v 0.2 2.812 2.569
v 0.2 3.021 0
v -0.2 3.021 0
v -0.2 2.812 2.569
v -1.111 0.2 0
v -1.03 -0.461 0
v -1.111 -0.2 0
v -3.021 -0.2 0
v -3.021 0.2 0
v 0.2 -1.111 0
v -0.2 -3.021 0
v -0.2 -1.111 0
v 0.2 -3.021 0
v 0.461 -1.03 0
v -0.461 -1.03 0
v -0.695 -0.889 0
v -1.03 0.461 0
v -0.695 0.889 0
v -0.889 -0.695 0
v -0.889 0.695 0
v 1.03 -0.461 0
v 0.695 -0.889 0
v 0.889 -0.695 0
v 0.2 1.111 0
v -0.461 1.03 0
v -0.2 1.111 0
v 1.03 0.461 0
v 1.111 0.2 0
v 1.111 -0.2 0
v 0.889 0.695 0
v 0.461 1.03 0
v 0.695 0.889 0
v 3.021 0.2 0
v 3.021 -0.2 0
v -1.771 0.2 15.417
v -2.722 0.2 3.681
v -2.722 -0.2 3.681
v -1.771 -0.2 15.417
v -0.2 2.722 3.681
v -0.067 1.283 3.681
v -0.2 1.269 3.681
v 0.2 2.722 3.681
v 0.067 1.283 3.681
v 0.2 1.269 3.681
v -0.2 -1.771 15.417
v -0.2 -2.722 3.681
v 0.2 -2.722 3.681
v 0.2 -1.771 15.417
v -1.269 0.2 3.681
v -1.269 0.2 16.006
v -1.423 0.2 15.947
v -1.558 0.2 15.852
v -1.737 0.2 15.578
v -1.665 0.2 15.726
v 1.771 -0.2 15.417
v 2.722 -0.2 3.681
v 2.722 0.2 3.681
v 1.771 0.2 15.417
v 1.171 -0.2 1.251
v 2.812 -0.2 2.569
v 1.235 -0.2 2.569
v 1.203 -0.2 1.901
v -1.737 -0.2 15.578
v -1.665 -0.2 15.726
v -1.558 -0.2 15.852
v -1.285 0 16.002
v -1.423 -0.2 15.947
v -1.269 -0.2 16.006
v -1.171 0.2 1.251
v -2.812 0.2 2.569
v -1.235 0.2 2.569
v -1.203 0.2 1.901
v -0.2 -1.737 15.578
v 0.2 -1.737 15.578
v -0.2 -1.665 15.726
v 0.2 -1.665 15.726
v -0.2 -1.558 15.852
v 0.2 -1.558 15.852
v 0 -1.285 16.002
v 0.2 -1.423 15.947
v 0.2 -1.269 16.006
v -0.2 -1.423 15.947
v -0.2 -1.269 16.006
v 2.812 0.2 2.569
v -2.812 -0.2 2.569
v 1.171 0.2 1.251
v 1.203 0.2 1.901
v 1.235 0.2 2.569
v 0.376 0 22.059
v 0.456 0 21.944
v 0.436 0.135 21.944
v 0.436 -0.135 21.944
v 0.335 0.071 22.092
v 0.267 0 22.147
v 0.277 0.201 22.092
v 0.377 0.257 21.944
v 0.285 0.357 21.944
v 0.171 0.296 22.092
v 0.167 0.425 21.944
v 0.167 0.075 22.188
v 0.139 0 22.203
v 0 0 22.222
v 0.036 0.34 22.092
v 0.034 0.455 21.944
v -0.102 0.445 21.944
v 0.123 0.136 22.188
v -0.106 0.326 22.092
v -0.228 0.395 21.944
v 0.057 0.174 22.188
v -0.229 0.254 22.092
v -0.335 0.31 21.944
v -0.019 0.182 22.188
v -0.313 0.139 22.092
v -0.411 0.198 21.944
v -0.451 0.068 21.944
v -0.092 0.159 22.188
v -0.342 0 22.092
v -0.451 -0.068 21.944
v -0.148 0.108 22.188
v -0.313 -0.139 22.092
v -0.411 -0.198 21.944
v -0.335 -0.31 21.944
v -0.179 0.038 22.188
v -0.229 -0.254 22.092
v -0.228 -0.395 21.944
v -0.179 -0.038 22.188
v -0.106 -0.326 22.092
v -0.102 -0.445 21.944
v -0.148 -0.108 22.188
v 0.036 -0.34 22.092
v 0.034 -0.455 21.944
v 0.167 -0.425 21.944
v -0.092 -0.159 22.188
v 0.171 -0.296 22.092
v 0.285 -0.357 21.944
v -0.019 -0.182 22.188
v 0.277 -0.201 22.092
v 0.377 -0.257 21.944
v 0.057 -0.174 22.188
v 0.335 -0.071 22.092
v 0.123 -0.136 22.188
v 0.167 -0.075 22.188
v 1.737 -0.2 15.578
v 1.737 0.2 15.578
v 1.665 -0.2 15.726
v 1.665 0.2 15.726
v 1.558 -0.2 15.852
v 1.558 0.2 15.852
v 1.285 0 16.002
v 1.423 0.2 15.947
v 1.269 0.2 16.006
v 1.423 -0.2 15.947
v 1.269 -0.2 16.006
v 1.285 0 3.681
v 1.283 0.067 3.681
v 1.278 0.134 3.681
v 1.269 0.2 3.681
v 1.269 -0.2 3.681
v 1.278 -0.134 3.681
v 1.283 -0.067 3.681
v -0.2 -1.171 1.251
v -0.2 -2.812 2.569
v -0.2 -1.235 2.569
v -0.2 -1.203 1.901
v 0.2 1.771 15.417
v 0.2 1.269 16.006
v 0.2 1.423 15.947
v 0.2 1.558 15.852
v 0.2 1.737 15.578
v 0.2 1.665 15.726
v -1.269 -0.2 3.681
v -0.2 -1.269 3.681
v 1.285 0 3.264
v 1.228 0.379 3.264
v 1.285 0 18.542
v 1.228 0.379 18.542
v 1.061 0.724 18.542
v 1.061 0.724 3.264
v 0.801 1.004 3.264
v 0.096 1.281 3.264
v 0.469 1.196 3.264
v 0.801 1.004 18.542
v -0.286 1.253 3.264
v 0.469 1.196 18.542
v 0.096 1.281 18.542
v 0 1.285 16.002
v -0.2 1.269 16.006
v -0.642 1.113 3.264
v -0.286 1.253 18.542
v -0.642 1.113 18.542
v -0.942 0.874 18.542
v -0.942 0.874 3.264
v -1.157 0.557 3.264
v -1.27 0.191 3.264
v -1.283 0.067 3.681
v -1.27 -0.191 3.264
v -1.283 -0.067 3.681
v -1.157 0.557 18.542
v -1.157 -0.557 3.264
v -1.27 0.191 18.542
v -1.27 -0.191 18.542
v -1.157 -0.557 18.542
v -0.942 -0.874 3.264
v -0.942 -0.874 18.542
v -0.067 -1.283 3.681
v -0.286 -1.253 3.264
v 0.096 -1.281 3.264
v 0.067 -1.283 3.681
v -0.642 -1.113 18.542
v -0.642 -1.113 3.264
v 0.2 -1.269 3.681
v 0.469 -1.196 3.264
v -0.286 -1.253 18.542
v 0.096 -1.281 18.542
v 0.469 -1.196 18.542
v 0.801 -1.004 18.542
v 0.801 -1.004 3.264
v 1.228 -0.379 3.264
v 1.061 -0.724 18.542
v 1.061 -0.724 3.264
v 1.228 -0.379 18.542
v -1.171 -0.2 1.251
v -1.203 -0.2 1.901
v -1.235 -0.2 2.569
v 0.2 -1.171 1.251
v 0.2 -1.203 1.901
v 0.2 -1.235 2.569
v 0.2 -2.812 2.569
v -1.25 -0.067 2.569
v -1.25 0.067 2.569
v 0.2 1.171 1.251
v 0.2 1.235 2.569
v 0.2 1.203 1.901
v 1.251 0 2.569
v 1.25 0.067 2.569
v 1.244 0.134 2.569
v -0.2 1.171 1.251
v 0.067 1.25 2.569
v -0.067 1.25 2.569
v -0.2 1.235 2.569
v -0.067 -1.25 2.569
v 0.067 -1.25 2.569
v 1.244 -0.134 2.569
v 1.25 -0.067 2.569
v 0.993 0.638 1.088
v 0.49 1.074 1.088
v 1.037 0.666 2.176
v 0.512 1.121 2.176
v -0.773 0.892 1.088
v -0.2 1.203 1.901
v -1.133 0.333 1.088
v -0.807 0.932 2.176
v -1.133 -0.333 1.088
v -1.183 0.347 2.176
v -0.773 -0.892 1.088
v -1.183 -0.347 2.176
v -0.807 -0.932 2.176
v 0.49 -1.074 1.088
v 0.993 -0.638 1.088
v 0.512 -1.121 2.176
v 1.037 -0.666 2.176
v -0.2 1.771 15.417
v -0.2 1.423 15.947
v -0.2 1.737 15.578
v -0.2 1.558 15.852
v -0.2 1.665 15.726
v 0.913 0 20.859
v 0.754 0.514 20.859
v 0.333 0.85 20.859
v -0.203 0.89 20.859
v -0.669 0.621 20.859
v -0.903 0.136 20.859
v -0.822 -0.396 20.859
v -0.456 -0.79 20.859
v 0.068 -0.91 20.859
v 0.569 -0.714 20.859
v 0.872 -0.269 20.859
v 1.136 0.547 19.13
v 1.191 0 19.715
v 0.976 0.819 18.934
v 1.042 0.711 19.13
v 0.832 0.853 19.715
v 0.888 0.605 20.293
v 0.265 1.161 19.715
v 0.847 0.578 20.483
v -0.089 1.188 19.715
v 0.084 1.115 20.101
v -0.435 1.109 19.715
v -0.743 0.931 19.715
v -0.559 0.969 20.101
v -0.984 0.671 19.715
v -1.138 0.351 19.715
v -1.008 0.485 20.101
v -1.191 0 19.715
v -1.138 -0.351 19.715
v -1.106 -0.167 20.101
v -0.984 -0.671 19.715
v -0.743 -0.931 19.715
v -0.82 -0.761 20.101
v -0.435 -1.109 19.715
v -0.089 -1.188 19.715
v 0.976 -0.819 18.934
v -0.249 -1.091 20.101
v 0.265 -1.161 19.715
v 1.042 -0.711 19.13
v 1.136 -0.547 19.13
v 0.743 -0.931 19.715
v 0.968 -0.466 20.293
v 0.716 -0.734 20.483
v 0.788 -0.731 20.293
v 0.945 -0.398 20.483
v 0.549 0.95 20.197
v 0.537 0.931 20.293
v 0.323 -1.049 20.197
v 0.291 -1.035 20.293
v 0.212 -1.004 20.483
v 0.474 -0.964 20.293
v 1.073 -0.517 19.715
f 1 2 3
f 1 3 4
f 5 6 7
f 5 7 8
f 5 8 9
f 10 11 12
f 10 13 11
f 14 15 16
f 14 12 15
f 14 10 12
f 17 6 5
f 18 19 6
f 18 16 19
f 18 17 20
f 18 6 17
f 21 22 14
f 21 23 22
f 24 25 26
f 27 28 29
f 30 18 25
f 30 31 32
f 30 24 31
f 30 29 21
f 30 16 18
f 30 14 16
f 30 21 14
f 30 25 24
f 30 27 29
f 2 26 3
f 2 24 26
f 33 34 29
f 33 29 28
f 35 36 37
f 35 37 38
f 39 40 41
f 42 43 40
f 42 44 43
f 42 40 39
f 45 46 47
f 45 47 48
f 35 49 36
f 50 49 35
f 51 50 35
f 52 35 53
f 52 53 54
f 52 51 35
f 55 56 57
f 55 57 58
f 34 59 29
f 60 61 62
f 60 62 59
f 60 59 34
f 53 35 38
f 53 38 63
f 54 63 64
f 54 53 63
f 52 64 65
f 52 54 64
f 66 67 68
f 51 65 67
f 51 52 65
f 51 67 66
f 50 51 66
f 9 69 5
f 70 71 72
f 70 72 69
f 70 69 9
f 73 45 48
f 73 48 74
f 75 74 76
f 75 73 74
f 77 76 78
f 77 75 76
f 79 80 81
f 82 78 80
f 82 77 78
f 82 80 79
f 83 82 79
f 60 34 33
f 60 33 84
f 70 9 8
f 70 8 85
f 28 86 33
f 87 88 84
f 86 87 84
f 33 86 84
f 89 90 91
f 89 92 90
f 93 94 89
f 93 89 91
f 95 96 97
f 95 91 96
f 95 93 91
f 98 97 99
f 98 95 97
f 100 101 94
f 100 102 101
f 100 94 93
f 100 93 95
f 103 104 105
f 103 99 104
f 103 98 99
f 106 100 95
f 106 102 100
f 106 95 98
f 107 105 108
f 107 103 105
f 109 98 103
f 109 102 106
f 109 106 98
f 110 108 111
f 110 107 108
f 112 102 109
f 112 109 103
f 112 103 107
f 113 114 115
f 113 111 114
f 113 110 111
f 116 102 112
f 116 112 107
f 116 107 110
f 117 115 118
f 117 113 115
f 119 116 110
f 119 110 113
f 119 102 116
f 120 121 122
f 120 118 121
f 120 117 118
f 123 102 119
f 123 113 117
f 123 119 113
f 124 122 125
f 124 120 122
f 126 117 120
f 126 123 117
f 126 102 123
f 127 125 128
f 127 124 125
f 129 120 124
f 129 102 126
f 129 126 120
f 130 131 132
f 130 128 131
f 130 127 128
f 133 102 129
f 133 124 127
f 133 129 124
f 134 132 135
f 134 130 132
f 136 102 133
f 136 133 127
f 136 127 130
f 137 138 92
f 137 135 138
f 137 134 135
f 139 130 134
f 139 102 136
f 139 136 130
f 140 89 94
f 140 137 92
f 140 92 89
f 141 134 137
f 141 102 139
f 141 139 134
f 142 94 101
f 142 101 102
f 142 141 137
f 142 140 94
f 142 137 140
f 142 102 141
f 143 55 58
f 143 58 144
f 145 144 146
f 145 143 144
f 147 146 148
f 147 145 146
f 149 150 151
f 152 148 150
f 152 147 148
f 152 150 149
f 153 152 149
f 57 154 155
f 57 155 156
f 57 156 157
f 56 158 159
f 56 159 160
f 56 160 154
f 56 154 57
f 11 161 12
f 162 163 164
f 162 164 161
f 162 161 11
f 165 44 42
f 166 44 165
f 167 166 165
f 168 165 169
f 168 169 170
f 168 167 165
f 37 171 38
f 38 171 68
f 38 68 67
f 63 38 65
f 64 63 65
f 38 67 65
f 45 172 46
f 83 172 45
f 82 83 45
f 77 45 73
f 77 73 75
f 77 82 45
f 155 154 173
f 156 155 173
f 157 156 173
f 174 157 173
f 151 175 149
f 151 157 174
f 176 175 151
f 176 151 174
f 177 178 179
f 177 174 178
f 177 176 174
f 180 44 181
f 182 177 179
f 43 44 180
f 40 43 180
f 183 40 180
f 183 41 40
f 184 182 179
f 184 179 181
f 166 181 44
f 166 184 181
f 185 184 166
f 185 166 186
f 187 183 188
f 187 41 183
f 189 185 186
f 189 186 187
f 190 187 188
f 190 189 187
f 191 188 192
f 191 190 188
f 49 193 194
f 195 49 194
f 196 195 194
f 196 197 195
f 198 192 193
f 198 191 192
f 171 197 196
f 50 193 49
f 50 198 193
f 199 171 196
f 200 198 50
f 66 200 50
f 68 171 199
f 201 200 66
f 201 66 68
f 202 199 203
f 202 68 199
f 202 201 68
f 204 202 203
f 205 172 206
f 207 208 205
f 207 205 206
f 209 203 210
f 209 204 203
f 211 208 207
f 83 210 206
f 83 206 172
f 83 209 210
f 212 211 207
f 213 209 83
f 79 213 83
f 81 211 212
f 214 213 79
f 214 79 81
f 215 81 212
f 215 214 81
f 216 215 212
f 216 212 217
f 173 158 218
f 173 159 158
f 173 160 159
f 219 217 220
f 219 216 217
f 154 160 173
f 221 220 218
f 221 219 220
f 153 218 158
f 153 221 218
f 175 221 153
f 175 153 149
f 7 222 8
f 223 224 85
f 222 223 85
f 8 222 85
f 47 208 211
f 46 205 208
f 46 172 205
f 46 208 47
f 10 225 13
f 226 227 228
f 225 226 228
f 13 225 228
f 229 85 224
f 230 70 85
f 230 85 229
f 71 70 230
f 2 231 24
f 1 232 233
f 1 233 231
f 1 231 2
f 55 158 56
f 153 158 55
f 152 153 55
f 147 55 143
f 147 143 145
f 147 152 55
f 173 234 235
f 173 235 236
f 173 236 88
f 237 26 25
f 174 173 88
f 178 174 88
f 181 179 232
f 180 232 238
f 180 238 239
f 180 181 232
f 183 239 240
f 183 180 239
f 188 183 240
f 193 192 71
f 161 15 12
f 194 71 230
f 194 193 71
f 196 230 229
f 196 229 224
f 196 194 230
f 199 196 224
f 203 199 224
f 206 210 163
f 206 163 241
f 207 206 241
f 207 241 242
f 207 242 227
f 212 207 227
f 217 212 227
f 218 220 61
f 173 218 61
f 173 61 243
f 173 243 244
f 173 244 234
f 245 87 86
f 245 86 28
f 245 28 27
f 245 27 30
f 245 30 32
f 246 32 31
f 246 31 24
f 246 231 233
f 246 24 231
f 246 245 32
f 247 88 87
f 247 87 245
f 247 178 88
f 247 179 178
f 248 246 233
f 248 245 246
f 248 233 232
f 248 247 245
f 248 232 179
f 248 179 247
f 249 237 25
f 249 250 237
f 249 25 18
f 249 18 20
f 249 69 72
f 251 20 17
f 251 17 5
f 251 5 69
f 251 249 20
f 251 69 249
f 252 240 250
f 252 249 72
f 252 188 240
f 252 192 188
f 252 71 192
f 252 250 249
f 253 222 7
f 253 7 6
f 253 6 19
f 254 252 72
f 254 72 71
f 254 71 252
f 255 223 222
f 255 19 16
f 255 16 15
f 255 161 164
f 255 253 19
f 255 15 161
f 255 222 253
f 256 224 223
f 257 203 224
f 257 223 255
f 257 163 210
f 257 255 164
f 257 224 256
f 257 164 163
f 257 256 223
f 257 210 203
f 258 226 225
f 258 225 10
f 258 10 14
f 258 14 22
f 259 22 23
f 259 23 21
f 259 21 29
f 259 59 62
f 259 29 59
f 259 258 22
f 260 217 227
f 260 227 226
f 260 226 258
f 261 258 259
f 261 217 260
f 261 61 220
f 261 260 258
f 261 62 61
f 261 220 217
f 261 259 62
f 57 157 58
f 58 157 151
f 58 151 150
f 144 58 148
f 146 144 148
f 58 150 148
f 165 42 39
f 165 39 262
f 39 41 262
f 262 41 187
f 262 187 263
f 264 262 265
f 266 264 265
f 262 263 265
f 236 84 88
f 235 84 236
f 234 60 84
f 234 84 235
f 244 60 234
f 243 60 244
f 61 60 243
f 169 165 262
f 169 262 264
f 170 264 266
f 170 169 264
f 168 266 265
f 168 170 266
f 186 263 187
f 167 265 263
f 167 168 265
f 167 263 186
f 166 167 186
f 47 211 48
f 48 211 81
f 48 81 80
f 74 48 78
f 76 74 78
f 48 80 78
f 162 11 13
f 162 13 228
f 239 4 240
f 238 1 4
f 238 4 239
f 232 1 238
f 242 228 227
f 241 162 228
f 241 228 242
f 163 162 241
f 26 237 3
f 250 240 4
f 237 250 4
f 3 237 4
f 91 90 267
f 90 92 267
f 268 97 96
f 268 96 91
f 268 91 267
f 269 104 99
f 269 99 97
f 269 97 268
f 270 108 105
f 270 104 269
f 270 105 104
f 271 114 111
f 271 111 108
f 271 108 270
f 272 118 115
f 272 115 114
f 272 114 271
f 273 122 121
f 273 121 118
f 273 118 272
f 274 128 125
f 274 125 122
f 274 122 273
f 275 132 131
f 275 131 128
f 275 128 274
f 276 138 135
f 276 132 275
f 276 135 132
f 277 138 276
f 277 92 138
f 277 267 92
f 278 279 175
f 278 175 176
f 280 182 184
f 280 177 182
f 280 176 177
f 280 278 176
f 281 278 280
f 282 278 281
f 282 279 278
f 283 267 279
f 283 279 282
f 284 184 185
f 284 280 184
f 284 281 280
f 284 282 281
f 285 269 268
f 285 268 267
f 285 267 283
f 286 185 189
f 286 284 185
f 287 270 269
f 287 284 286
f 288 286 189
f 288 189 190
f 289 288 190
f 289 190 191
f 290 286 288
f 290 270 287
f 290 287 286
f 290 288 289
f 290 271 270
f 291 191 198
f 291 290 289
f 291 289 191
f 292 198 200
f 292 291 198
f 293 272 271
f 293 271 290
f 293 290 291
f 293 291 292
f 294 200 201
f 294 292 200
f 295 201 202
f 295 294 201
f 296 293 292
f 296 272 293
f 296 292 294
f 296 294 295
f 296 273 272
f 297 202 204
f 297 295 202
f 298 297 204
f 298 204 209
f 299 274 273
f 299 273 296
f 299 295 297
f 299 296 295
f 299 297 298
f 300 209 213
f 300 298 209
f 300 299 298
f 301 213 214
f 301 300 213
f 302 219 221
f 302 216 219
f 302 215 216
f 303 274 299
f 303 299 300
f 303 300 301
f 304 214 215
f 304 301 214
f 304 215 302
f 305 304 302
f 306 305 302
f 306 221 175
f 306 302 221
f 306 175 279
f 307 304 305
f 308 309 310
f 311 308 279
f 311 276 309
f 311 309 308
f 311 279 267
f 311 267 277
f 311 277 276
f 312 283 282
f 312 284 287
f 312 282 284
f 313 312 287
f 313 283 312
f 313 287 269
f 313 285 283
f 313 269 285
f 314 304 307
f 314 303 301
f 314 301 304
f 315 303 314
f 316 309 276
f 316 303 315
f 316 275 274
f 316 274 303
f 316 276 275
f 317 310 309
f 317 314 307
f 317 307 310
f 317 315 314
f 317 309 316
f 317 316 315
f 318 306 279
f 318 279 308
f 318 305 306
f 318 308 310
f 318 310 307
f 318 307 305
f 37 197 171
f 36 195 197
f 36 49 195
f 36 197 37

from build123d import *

# Parameters (mm, degrees)
F3_DEPTH = 0.2
F4_COUNT = 4


# Not quite as in the source:
# - a feature names something its author has since deleted; it is built from what else it names


with BuildPart() as f1:
    # F0 (on Front) → F1 (revolve)
    with BuildSketch(Plane.XZ):
        with BuildLine():
            Line((0, 22.2222222222), (0, 0))
            Line((0, 0), (1.1284722222, 0))
            Line((1.1284722222, 0), (1.2847222222, 3.2638888889))
            Line((1.2847222222, 3.2638888889), (1.2847222222, 18.5416666667))
            ThreePointArc((1.2847222222, 18.5416666667), (1.074687159, 20.2927272078), (0.4564979348, 21.9444444444))
            ThreePointArc((0.4564979348, 21.9444444444), (0.2671847948, 22.1473201826), (0, 22.2222222222))
        make_face()
    revolve(axis=Axis((0, 0, 11.1111111111), (0, 0, 1)))

    # F2 (on Front) → F3 (join, symmetric)
    with BuildSketch(Plane.XZ):
        Polygon((0, 3.2638888889), (0, 0), (3.0208333333, 0), (2.8125, 2.5694444444), (0.4, 2.5694444444), (0.4, 3.2638888889), align=None)
        with BuildLine():
            Line((0, 16.0250628992), (0, 3.2638888889))
            Line((0, 3.2638888889), (0.4, 3.2638888889))
            Line((0.4, 3.2638888889), (0.4, 3.6805555556))
            Line((0.4, 3.6805555556), (2.7224099099, 3.6805555556))
            Line((2.7224099099, 3.6805555556), (1.7708333333, 15.4166666667))
            ThreePointArc((1.7708333333, 15.4166666667), (1.5598257716, 15.8497451466), (1.1111111111, 16.0250628992))
            Line((1.1111111111, 16.0250628992), (0, 16.0250628992))
        make_face()
    extrude(amount=F3_DEPTH, both=True)

    # F4: F1 ×4 about axis
    f4_axis = Axis((0, 0, 3.2638888889), (0, 0, 1))


with BuildPart() as f1_1:
    add(f1.part)
    for i in range(1, F4_COUNT):
        add(f1.part.rotate(f4_axis, i * 360 / F4_COUNT))


solid = f1_1.part
